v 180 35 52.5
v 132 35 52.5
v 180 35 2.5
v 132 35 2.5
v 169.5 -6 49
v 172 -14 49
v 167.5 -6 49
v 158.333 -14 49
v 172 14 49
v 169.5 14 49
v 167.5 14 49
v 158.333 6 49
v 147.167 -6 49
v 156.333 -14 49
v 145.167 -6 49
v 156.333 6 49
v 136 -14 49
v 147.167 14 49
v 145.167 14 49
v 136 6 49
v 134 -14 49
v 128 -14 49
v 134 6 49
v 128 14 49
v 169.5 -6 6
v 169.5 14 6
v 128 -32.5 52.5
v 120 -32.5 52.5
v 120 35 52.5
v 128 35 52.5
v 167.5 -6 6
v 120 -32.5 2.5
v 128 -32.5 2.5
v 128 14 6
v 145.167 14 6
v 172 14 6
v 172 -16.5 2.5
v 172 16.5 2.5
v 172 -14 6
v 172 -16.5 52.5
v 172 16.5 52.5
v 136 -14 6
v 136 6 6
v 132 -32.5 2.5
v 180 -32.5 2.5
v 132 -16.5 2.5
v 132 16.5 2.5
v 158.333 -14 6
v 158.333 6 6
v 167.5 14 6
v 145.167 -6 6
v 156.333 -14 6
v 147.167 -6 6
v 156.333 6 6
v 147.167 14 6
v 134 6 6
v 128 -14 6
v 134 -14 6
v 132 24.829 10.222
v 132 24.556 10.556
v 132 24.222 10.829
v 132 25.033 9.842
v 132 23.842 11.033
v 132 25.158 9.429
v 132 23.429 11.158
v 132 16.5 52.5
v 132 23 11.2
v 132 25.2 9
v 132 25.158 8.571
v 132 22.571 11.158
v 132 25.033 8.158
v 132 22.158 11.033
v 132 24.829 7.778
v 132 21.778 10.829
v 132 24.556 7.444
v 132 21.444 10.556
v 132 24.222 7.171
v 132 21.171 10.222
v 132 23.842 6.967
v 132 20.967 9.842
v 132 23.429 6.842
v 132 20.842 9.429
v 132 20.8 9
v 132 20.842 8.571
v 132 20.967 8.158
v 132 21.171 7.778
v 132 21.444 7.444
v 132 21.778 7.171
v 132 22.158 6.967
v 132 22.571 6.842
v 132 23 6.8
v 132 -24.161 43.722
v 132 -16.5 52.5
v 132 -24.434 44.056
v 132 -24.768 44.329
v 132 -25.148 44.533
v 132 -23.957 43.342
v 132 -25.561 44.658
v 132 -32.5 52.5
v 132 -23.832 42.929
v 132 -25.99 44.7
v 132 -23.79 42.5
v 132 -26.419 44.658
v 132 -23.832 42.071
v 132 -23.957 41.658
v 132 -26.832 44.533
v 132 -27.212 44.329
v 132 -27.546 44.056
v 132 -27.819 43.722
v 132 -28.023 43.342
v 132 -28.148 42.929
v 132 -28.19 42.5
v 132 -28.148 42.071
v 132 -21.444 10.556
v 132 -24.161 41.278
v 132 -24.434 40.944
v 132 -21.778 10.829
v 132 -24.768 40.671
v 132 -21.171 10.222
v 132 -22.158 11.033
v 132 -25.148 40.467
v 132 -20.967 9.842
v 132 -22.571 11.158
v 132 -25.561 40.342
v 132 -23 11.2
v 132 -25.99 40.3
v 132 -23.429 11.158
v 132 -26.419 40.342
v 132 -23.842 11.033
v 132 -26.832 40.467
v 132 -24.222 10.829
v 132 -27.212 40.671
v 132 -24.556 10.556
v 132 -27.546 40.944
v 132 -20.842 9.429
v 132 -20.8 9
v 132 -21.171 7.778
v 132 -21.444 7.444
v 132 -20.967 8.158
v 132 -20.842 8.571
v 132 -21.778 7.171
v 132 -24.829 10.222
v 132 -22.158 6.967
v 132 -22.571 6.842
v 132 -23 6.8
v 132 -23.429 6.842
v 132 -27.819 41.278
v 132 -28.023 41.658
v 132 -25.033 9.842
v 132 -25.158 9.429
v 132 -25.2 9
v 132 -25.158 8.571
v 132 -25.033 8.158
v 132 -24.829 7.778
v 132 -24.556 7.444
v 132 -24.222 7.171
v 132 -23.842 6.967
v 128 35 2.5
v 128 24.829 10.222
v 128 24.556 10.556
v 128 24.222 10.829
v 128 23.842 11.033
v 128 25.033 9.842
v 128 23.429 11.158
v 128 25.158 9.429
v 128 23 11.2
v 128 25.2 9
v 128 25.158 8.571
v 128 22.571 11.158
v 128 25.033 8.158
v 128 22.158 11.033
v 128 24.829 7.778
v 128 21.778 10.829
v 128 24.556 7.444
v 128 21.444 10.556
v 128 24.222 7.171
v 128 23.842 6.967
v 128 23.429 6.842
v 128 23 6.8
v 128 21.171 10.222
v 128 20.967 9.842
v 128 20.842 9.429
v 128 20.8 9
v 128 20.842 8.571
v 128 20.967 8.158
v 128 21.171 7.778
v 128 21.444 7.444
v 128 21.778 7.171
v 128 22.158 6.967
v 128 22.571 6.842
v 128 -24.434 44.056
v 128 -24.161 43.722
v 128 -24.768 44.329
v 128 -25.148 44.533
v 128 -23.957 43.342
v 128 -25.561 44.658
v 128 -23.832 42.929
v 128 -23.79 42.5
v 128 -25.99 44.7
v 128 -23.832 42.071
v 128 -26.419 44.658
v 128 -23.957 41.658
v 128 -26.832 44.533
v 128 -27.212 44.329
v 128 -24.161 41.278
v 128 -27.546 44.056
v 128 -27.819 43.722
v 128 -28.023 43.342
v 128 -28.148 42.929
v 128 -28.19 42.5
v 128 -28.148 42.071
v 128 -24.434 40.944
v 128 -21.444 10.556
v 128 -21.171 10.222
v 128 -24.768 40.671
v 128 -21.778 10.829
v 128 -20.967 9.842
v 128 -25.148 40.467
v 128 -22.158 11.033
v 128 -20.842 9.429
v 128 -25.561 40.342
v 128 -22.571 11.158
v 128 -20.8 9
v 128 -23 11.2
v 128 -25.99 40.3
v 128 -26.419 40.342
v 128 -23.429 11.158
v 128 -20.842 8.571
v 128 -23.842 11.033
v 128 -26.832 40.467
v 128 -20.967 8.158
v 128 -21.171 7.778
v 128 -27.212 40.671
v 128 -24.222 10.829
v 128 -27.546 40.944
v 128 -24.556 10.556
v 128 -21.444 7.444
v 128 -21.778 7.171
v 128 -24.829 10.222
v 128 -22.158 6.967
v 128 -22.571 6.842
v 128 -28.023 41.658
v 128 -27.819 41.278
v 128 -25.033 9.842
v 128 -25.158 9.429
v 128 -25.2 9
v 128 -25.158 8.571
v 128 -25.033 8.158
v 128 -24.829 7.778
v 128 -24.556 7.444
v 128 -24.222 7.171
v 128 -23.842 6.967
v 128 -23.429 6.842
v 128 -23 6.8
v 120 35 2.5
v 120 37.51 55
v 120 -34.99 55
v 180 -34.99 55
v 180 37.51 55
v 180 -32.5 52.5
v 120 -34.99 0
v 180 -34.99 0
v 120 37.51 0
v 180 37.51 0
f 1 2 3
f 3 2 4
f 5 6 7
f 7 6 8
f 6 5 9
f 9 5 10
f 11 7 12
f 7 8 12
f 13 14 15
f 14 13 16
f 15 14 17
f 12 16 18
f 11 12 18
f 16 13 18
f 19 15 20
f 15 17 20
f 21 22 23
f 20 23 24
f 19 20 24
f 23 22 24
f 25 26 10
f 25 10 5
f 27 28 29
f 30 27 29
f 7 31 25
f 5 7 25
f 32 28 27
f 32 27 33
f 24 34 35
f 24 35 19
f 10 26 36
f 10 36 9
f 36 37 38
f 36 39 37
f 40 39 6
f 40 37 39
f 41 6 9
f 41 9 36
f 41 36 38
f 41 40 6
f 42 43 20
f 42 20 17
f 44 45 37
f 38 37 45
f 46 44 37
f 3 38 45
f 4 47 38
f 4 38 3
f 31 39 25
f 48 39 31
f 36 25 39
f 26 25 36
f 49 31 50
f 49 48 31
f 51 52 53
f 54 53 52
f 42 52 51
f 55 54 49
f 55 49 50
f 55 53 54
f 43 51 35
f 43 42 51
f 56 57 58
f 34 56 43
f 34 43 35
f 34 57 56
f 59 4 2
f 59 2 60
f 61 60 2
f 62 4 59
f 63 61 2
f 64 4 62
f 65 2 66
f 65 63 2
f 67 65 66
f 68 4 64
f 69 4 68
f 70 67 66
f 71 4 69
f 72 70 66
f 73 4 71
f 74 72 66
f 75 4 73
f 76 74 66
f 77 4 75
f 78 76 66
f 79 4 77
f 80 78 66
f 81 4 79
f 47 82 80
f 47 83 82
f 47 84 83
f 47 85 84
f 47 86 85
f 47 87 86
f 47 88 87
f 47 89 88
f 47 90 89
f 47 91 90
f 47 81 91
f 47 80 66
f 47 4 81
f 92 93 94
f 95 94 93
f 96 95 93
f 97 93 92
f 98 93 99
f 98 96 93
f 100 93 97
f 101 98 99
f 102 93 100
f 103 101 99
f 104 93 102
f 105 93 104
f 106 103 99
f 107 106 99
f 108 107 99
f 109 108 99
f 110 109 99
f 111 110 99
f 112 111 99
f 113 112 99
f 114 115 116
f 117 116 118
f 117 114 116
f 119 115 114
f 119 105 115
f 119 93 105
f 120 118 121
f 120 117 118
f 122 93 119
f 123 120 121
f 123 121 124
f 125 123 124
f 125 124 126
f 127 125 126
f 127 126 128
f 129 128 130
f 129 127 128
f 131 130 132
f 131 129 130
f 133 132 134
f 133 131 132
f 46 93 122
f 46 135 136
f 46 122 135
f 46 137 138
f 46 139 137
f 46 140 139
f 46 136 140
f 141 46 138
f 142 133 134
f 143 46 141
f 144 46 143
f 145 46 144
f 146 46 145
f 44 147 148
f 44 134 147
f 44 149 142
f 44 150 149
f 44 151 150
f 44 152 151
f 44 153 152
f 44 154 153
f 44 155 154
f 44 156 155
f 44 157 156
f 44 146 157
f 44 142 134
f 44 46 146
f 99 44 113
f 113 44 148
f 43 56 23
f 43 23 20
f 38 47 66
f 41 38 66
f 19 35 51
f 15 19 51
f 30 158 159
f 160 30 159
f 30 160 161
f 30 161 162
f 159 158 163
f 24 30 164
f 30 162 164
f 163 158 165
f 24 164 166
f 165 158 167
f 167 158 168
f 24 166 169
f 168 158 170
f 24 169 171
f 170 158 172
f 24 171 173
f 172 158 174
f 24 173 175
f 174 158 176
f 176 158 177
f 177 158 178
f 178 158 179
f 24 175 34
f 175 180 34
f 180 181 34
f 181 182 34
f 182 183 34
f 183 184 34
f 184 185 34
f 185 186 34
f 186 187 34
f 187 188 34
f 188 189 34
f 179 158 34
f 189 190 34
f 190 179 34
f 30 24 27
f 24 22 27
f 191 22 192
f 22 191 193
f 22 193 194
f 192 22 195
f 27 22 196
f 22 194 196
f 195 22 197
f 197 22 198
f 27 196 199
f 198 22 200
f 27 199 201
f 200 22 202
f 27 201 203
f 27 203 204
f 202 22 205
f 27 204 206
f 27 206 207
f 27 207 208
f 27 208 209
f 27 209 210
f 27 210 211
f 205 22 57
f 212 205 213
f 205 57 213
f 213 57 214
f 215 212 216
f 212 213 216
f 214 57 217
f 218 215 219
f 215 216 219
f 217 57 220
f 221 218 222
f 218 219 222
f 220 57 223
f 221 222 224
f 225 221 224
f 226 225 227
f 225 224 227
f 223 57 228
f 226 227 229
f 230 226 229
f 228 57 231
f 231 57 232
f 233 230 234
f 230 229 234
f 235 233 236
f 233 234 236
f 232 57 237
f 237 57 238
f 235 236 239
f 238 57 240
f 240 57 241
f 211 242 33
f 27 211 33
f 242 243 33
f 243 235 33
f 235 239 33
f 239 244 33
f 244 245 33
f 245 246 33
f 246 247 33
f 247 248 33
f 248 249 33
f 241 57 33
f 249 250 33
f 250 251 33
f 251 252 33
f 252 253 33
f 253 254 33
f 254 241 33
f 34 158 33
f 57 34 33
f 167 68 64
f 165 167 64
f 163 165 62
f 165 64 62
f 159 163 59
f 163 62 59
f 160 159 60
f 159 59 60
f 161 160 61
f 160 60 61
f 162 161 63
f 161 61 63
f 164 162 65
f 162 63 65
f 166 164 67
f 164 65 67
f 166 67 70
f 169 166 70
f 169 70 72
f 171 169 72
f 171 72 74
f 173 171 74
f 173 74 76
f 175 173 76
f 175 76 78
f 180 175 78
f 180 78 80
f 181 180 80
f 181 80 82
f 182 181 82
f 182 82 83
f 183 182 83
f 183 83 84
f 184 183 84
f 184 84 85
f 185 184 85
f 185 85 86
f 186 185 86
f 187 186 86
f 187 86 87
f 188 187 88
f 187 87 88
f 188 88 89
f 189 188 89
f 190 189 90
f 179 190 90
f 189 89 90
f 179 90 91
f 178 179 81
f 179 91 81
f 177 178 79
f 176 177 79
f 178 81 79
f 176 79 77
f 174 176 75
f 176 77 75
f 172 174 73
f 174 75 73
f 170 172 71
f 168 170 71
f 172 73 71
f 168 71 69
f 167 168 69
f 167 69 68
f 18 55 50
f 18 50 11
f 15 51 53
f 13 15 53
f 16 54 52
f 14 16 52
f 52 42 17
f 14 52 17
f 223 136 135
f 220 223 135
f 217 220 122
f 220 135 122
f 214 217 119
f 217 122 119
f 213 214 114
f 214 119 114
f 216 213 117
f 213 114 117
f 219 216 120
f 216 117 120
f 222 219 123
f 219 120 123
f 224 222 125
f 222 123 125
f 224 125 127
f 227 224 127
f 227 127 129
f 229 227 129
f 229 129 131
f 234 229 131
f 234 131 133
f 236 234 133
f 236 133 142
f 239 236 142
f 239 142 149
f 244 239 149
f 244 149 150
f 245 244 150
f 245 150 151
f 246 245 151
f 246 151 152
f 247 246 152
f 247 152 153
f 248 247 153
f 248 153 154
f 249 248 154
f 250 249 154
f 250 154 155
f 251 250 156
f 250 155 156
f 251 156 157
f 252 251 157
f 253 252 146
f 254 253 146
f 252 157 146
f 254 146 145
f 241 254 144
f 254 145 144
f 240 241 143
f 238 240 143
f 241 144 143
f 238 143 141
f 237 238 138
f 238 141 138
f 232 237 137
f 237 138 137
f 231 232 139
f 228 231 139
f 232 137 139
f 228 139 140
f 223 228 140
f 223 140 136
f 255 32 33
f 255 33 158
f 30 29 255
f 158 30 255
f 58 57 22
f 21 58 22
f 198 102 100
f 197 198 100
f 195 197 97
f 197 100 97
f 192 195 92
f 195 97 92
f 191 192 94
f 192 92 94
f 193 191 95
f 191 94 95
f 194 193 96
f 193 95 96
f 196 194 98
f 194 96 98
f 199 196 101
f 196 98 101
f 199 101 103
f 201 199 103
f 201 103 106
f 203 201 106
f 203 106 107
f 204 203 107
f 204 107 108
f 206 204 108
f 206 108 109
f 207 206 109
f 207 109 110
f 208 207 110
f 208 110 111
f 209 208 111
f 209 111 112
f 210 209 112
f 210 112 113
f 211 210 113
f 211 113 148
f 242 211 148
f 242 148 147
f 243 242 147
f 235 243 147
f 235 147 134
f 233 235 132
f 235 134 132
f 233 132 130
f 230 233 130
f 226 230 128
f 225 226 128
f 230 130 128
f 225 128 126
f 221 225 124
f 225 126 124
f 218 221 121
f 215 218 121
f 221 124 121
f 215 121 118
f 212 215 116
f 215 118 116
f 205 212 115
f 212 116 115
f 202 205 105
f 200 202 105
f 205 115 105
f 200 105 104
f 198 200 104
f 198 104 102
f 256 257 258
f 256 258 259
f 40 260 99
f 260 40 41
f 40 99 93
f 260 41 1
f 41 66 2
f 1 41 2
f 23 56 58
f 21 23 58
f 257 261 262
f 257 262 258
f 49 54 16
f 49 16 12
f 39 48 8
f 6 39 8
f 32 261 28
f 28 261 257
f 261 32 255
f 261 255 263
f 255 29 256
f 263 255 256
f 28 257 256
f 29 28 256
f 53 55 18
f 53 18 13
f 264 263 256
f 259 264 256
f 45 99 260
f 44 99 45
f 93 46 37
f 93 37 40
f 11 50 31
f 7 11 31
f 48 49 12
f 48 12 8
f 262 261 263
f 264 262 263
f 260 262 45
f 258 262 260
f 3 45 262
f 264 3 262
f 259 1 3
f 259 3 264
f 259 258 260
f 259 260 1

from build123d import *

# Parameters (mm, degrees)
SKETCH037_W     = 72.5
SKETCH037_H     = 55
PAD018_DEPTH    = 60
SKETCH038_W     = 67.5
SKETCH038_H     = 50
POCKET013_DEPTH = 60.001
SKETCH039_W     = 67.5
SKETCH039_H     = 4
PAD019_DEPTH    = 50
SKETCH040_R     = 2.2
HOLE006_DEPTH   = 25
SKETCH041_W     = 28
SKETCH041_H     = 43
POCKET014_DEPTH = 4
SKETCH042_W     = 33
SKETCH042_H     = 50
SKETCH042_W_2   = 28
SKETCH042_H_2   = 43
PAD020_DEPTH    = 40
SKETCH043_W     = 20
SKETCH043_H     = 2
PAD021_DEPTH    = 43


with BuildPart() as part:
    # Sketch037 → Pad018 (new body)
    with BuildSketch(Plane.YZ.offset(120)):
        with Locations((1.26, 27.5)):
            Rectangle(SKETCH037_W, SKETCH037_H)
    extrude(amount=PAD018_DEPTH)

    # Sketch038 (on Face5 of Pad018) → Pocket013 (cut, through all)
    with BuildSketch(Plane(origin=(120, 0, 0), x_dir=(0, 1, 0), z_dir=(-1, 0, 0))):
        with Locations((1.25, -27.5)):
            Rectangle(SKETCH038_W, SKETCH038_H)
    extrude(amount=-POCKET013_DEPTH, mode=Mode.SUBTRACT)

    # Sketch039 (on Face8 of Pocket013) → Pad019 (join)
    with BuildSketch(Plane(origin=(0, 0, 2.5), x_dir=(0, -1, 0), z_dir=(0, 0, 1))):
        with Locations((-1.25, 130)):
            Rectangle(SKETCH039_W, SKETCH039_H)
    extrude(amount=PAD019_DEPTH)

    # Sketch040 (on Face16 of Pad019) → Hole006 (cut)
    with BuildSketch(Plane.YZ.offset(132)):
        with Locations((-25.99, 42.5)):
            Circle(SKETCH040_R)
        with Locations((-23, 9)):
            Circle(SKETCH040_R)
        with Locations((23, 9)):
            Circle(SKETCH040_R)
    extrude(amount=-HOLE006_DEPTH, mode=Mode.SUBTRACT)

    # Sketch041 (on Face16 of Hole006) → Pocket014 (cut)
    with BuildSketch(Plane.YZ.offset(132)):
        with Locations((0, 27.5)):
            Rectangle(SKETCH041_W, SKETCH041_H)
    extrude(amount=-POCKET014_DEPTH, mode=Mode.SUBTRACT)

    # Sketch042 (on Face16 of Pocket014) → Pad020 (join)
    with BuildSketch(Plane.YZ.offset(132)):
        with Locations((0, 27.5)):
            Rectangle(SKETCH042_W, SKETCH042_H)
        with Locations((0, 27.5)):
            Rectangle(SKETCH042_W_2, SKETCH042_H_2, mode=Mode.SUBTRACT)
    extrude(amount=PAD020_DEPTH)

    # Sketch043 (on Face29 of Pad020) → Pad021 (join)
    with BuildSketch(Plane(origin=(0, 0, 6), x_dir=(0, -1, 0), z_dir=(0, 0, 1))):
        with Locations((-4, 168.5)):
            Rectangle(SKETCH043_W, SKETCH043_H)
        with Locations((4, 157.333333)):
            Rectangle(SKETCH043_W, SKETCH043_H)
        with Locations((-4, 146.166667)):
            Rectangle(SKETCH043_W, SKETCH043_H)
        with Locations((4, 135)):
            Rectangle(SKETCH043_W, SKETCH043_H)
    extrude(amount=PAD021_DEPTH)


solid = part.part
